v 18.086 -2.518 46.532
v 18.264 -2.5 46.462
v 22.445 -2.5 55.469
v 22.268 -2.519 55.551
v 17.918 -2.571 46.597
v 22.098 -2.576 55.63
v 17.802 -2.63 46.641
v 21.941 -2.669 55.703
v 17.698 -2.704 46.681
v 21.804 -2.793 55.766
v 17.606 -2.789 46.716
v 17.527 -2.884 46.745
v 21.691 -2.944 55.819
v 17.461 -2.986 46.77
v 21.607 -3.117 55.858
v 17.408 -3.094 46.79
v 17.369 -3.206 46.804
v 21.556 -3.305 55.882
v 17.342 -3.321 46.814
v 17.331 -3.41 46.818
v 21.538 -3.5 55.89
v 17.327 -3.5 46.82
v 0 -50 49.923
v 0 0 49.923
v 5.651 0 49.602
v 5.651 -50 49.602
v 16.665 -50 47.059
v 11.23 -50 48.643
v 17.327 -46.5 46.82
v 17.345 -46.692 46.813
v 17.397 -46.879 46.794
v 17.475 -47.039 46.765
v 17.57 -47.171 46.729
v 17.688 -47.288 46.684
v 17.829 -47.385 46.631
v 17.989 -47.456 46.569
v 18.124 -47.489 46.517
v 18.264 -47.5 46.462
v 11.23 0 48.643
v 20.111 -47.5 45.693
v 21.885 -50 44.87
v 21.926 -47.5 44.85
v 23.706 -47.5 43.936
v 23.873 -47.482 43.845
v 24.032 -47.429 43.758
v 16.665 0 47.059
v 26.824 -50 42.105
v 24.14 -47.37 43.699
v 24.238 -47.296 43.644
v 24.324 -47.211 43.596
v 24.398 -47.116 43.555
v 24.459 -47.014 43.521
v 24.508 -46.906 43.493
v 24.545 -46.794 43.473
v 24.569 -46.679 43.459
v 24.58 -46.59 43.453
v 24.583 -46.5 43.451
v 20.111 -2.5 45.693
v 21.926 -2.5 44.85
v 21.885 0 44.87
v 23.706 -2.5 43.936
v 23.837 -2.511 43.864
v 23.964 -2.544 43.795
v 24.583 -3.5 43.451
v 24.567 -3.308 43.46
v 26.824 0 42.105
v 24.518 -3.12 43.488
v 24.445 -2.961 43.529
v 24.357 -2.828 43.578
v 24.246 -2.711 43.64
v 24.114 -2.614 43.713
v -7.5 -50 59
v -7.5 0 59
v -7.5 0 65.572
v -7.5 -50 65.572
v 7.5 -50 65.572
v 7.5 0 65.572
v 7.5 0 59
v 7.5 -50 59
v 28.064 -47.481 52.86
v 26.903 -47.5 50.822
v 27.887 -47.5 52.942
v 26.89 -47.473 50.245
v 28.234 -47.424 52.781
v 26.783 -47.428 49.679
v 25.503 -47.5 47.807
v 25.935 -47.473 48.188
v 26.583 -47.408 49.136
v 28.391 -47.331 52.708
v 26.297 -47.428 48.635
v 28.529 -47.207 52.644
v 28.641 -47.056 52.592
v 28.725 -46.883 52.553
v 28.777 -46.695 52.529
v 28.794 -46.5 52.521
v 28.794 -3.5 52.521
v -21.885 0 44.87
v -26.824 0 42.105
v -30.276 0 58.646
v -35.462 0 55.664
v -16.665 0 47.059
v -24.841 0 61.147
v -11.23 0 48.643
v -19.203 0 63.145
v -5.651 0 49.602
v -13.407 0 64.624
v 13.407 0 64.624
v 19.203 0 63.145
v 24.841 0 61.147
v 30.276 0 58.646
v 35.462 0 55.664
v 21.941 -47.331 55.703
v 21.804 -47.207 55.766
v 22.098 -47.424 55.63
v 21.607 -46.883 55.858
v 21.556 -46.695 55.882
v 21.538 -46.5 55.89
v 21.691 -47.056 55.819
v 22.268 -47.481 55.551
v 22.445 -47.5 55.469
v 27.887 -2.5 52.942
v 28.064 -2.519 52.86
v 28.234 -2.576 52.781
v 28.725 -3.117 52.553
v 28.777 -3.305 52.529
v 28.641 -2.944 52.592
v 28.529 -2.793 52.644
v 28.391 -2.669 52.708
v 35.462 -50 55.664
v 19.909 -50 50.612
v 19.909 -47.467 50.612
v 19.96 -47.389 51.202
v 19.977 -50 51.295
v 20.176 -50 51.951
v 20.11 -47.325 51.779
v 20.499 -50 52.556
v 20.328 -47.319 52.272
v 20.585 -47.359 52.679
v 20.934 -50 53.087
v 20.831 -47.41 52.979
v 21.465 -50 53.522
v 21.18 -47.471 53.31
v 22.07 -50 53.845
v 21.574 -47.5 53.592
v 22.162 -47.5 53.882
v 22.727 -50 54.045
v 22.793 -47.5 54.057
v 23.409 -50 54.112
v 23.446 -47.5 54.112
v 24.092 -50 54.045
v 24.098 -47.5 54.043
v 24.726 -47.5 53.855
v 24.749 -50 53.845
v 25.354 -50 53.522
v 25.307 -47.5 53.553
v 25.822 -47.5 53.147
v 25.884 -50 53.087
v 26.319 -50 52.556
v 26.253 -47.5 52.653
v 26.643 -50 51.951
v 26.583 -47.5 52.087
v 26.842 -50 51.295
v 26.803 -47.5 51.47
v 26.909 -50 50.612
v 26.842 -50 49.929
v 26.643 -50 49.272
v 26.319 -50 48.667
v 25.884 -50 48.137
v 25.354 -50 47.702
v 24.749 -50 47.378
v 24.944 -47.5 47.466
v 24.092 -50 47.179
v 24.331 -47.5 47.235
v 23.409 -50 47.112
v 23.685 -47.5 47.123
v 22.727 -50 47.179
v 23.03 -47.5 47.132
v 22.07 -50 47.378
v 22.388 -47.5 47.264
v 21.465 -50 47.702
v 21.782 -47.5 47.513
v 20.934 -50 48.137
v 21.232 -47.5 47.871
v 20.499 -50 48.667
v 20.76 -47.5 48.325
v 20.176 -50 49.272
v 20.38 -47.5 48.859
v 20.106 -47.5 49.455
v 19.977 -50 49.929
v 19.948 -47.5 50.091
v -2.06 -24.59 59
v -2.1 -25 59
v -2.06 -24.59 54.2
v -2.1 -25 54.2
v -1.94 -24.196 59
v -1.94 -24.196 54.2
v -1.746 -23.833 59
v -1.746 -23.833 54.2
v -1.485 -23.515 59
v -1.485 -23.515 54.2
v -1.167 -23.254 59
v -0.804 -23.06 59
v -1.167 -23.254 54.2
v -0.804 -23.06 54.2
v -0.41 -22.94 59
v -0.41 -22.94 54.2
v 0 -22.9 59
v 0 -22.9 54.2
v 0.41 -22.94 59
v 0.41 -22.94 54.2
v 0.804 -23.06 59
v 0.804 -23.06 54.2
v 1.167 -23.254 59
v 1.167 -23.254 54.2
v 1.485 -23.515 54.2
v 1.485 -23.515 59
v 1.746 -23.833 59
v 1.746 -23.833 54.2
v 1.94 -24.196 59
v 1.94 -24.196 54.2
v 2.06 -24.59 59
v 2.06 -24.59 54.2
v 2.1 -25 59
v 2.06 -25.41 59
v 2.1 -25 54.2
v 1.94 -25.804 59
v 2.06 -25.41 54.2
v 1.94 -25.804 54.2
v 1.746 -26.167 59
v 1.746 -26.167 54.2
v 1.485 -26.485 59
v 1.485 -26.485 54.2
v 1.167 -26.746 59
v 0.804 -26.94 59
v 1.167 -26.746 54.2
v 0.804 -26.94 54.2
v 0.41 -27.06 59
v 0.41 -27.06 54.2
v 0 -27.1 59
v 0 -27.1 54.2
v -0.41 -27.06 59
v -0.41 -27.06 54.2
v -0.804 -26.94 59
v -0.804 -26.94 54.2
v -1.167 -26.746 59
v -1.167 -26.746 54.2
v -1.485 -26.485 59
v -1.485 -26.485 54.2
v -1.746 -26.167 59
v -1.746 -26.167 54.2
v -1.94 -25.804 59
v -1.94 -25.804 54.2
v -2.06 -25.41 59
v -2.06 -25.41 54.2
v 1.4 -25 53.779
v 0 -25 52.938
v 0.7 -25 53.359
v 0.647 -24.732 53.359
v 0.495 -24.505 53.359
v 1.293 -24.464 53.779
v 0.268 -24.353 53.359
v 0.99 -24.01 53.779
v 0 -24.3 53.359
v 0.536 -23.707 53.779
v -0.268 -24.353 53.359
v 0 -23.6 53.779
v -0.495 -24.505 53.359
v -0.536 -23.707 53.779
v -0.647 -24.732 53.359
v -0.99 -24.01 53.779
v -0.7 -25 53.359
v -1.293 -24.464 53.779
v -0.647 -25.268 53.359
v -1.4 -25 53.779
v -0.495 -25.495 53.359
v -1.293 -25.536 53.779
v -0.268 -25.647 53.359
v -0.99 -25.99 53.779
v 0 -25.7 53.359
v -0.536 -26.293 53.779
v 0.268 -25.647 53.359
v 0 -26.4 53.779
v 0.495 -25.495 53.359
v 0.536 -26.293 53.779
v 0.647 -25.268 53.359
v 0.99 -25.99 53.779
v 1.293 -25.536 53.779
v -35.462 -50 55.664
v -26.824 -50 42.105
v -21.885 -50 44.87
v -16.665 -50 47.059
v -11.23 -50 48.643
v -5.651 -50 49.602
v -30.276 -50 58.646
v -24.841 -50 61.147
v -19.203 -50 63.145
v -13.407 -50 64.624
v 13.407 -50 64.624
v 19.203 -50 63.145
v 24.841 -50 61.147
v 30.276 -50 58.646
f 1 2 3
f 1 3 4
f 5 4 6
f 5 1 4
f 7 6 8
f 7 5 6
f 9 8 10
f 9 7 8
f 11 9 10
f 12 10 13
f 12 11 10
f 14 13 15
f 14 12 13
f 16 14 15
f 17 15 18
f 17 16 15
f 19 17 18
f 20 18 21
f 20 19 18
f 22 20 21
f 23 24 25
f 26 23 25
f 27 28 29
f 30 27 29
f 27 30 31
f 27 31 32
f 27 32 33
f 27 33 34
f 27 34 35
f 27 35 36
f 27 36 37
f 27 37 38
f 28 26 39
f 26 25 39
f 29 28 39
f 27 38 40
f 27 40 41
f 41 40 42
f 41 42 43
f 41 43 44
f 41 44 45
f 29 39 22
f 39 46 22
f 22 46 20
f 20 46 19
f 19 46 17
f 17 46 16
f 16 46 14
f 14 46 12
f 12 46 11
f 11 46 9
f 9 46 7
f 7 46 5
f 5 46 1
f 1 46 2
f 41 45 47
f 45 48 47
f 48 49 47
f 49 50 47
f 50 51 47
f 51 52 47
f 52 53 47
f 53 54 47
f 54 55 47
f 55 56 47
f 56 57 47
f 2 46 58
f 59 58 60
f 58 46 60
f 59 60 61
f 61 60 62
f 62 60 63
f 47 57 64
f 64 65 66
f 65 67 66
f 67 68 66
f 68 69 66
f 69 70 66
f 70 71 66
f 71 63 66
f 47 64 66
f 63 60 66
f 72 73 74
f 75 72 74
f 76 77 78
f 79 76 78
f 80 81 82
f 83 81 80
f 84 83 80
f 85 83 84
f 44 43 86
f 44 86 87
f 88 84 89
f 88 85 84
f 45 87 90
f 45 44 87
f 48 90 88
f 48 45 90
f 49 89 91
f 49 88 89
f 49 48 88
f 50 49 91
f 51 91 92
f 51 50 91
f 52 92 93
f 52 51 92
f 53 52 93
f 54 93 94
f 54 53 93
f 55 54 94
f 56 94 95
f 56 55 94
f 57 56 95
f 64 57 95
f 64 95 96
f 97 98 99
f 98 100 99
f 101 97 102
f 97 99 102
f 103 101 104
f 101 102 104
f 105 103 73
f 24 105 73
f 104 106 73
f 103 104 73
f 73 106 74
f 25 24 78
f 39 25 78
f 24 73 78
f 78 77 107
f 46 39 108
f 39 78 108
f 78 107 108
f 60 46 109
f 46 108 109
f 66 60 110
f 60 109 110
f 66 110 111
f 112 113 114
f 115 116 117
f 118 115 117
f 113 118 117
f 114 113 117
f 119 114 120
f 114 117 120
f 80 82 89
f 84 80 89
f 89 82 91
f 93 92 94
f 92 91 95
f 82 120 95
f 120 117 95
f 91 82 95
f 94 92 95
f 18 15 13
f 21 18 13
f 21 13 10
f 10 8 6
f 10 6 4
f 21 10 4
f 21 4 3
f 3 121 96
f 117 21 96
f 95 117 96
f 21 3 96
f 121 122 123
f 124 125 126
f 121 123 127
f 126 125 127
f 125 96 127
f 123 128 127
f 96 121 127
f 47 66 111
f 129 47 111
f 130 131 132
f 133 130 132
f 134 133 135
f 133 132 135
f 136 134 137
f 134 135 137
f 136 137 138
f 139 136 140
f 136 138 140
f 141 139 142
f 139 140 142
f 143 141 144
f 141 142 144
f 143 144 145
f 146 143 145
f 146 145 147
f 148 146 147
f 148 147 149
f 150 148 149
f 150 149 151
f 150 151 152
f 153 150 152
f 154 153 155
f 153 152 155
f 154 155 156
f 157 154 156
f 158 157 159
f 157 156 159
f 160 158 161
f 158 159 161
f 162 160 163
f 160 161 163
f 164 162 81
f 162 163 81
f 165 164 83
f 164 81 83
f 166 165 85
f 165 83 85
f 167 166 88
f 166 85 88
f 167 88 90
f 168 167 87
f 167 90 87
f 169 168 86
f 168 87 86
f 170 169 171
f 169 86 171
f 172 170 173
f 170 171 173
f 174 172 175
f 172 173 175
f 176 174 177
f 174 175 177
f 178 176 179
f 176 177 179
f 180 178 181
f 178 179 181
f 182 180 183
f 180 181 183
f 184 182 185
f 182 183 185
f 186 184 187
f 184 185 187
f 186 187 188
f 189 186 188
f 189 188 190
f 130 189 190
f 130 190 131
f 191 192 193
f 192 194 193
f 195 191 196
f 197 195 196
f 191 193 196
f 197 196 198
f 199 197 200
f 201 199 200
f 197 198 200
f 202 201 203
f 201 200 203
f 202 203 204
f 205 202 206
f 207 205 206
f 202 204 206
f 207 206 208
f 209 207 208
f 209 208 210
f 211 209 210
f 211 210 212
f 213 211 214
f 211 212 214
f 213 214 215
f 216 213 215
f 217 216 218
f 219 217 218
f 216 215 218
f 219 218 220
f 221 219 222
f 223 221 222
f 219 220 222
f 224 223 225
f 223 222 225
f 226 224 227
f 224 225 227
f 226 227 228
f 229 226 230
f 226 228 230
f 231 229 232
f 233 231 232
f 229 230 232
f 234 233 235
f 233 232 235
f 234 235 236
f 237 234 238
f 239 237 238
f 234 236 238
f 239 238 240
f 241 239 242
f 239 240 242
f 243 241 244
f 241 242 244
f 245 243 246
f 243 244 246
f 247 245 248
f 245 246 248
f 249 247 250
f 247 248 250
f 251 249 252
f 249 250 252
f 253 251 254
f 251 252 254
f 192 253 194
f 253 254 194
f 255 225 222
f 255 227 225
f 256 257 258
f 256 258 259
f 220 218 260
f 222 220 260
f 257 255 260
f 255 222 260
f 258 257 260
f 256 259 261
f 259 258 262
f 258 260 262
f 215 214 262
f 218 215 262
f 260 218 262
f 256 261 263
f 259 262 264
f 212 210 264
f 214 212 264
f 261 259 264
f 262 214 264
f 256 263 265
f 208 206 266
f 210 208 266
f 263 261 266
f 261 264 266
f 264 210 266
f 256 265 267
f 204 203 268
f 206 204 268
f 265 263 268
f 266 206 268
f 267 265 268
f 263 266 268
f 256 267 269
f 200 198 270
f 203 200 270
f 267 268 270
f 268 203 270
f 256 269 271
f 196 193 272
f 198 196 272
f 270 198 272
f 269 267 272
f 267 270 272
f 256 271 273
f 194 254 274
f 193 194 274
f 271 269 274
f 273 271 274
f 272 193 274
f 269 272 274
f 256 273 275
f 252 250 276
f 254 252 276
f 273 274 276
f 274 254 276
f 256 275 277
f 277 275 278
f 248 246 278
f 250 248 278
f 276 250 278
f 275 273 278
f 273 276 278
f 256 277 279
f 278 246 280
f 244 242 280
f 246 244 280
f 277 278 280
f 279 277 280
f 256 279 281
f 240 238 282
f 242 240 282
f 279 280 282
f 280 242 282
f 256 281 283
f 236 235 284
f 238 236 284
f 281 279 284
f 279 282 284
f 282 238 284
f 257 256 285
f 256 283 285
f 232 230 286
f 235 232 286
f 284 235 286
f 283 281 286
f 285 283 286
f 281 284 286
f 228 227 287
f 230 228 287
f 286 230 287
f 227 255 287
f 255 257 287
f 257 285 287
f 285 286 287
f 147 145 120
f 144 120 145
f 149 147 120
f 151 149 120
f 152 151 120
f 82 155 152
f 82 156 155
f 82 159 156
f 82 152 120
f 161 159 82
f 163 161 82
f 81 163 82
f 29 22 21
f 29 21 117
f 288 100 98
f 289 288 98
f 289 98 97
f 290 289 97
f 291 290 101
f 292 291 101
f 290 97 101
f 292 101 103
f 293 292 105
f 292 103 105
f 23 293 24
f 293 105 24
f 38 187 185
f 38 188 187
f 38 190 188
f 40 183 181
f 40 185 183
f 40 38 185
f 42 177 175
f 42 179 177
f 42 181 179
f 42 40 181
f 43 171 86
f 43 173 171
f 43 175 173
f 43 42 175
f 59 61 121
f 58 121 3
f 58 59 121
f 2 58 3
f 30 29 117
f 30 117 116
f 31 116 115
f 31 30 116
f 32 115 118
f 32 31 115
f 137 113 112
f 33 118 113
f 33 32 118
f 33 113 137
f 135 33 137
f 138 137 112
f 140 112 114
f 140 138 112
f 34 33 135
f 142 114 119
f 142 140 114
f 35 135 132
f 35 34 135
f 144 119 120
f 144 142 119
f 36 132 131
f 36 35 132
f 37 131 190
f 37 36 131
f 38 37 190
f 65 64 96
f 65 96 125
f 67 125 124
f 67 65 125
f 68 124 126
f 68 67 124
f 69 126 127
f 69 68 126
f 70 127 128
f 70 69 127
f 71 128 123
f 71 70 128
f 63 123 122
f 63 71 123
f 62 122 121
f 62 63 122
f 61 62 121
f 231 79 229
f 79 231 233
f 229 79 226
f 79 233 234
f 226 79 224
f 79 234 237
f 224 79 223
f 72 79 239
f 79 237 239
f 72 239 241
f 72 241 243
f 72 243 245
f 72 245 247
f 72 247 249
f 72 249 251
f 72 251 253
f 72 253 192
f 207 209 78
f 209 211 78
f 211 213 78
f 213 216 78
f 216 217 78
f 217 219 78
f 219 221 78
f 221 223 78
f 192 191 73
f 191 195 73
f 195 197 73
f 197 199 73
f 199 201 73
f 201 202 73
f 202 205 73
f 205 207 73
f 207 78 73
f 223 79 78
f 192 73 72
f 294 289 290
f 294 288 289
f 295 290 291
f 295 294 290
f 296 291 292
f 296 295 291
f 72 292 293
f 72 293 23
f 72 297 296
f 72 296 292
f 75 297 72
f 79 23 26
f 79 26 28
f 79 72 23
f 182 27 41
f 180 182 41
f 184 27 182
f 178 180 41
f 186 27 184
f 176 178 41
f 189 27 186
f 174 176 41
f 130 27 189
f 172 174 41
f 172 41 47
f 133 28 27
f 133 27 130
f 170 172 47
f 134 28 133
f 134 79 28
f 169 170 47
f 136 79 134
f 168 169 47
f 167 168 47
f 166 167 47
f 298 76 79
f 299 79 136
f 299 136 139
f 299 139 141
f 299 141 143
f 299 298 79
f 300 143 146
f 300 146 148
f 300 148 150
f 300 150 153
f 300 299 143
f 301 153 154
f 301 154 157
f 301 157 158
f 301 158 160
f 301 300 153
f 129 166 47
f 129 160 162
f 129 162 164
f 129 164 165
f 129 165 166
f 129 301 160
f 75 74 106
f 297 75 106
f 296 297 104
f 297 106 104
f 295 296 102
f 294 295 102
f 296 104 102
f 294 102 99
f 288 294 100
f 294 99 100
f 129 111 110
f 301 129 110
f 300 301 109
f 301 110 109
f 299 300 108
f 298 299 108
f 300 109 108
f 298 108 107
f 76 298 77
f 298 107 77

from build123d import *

# Parameters (mm, degrees)
F3_DEPTH  = 50
F7_DEPTH  = 10
F9_D      = 4.2
F9_DEPTH  = 4.8
F9_TIP    = 1.2618073
F11_D     = 7
F11_DEPTH = 28
F11_TIP   = 2.1030121666


with BuildPart() as f3:
    # F2 (on Front) → F3 (new body)
    with BuildSketch(Plane.XZ):
        with BuildLine():
            ThreePointArc((-26.8236083475, 42.1046311493), (-13.9699038675, 47.9285688805), (0, 49.923))
            Line((0, 49.923), (0, 59))
            Line((0, 59), (-7.5, 59))
            Line((-7.5, 59), (-7.5, 65.5724789832))
            ThreePointArc((-7.5, 65.5724789832), (-22.044813763, 62.2095345277), (-35.4617741509, 55.6638354237))
            Line((-35.4617741509, 55.6638354237), (-26.8236083475, 42.1046311493))
        make_face()
        with BuildLine():
            ThreePointArc((0, 49.923), (13.9699038675, 47.9285688805), (26.8236083475, 42.1046311493))
            Line((26.8236083475, 42.1046311493), (35.4617741509, 55.6638354237))
            ThreePointArc((35.4617741509, 55.6638354237), (22.044813763, 62.2095345277), (7.5, 65.5724789832))
            Line((7.5, 65.5724789832), (7.5, 59))
            Line((7.5, 59), (0, 59))
            Line((0, 59), (0, 49.923))
        make_face()
    extrude(amount=F3_DEPTH)

    # F6 (on line) → F7 (cut)
    with BuildSketch(Plane(origin=(20.9552129656, 0, 45.1351855936), x_dir=(0.9070121064, 0, -0.4211045463), z_dir=(0.4211045463, 0, 0.9070121064))):
        with BuildLine():
            ThreePointArc((3, -47.5), (3.7071067812, -47.2071067812), (4, -46.5))
            Line((4, -46.5), (4, -3.5))
            ThreePointArc((4, -3.5), (3.7071067812, -2.7928932188), (3, -2.5))
            Line((3, -2.5), (-3, -2.5))
            ThreePointArc((-3, -2.5), (-3.7071067812, -2.7928932188), (-4, -3.5))
            Line((-4, -3.5), (-4, -46.5))
            ThreePointArc((-4, -46.5), (-3.7071067812, -47.2071067812), (-3, -47.5))
            Line((-3, -47.5), (3, -47.5))
        make_face()
    extrude(amount=F7_DEPTH, mode=Mode.SUBTRACT)

    # F9
    with Locations(Plane.XY.offset(59)):
        with Locations((0, -25)):
            Hole(F9_D / 2, depth=F9_DEPTH)
            with Locations((0, 0, -(F9_DEPTH + F9_TIP / 2))):  # 118° drill point
                Cone(0, F9_D / 2, F9_TIP, mode=Mode.SUBTRACT)

    # F11
    with Locations(Plane.XZ.offset(50)):
        with Locations((23.4093313461, 50.6118115303)):
            Hole(F11_D / 2, depth=F11_DEPTH)
            with Locations((0, 0, -(F11_DEPTH + F11_TIP / 2))):  # 118° drill point
                Cone(0, F11_D / 2, F11_TIP, mode=Mode.SUBTRACT)


solid = f3.part
